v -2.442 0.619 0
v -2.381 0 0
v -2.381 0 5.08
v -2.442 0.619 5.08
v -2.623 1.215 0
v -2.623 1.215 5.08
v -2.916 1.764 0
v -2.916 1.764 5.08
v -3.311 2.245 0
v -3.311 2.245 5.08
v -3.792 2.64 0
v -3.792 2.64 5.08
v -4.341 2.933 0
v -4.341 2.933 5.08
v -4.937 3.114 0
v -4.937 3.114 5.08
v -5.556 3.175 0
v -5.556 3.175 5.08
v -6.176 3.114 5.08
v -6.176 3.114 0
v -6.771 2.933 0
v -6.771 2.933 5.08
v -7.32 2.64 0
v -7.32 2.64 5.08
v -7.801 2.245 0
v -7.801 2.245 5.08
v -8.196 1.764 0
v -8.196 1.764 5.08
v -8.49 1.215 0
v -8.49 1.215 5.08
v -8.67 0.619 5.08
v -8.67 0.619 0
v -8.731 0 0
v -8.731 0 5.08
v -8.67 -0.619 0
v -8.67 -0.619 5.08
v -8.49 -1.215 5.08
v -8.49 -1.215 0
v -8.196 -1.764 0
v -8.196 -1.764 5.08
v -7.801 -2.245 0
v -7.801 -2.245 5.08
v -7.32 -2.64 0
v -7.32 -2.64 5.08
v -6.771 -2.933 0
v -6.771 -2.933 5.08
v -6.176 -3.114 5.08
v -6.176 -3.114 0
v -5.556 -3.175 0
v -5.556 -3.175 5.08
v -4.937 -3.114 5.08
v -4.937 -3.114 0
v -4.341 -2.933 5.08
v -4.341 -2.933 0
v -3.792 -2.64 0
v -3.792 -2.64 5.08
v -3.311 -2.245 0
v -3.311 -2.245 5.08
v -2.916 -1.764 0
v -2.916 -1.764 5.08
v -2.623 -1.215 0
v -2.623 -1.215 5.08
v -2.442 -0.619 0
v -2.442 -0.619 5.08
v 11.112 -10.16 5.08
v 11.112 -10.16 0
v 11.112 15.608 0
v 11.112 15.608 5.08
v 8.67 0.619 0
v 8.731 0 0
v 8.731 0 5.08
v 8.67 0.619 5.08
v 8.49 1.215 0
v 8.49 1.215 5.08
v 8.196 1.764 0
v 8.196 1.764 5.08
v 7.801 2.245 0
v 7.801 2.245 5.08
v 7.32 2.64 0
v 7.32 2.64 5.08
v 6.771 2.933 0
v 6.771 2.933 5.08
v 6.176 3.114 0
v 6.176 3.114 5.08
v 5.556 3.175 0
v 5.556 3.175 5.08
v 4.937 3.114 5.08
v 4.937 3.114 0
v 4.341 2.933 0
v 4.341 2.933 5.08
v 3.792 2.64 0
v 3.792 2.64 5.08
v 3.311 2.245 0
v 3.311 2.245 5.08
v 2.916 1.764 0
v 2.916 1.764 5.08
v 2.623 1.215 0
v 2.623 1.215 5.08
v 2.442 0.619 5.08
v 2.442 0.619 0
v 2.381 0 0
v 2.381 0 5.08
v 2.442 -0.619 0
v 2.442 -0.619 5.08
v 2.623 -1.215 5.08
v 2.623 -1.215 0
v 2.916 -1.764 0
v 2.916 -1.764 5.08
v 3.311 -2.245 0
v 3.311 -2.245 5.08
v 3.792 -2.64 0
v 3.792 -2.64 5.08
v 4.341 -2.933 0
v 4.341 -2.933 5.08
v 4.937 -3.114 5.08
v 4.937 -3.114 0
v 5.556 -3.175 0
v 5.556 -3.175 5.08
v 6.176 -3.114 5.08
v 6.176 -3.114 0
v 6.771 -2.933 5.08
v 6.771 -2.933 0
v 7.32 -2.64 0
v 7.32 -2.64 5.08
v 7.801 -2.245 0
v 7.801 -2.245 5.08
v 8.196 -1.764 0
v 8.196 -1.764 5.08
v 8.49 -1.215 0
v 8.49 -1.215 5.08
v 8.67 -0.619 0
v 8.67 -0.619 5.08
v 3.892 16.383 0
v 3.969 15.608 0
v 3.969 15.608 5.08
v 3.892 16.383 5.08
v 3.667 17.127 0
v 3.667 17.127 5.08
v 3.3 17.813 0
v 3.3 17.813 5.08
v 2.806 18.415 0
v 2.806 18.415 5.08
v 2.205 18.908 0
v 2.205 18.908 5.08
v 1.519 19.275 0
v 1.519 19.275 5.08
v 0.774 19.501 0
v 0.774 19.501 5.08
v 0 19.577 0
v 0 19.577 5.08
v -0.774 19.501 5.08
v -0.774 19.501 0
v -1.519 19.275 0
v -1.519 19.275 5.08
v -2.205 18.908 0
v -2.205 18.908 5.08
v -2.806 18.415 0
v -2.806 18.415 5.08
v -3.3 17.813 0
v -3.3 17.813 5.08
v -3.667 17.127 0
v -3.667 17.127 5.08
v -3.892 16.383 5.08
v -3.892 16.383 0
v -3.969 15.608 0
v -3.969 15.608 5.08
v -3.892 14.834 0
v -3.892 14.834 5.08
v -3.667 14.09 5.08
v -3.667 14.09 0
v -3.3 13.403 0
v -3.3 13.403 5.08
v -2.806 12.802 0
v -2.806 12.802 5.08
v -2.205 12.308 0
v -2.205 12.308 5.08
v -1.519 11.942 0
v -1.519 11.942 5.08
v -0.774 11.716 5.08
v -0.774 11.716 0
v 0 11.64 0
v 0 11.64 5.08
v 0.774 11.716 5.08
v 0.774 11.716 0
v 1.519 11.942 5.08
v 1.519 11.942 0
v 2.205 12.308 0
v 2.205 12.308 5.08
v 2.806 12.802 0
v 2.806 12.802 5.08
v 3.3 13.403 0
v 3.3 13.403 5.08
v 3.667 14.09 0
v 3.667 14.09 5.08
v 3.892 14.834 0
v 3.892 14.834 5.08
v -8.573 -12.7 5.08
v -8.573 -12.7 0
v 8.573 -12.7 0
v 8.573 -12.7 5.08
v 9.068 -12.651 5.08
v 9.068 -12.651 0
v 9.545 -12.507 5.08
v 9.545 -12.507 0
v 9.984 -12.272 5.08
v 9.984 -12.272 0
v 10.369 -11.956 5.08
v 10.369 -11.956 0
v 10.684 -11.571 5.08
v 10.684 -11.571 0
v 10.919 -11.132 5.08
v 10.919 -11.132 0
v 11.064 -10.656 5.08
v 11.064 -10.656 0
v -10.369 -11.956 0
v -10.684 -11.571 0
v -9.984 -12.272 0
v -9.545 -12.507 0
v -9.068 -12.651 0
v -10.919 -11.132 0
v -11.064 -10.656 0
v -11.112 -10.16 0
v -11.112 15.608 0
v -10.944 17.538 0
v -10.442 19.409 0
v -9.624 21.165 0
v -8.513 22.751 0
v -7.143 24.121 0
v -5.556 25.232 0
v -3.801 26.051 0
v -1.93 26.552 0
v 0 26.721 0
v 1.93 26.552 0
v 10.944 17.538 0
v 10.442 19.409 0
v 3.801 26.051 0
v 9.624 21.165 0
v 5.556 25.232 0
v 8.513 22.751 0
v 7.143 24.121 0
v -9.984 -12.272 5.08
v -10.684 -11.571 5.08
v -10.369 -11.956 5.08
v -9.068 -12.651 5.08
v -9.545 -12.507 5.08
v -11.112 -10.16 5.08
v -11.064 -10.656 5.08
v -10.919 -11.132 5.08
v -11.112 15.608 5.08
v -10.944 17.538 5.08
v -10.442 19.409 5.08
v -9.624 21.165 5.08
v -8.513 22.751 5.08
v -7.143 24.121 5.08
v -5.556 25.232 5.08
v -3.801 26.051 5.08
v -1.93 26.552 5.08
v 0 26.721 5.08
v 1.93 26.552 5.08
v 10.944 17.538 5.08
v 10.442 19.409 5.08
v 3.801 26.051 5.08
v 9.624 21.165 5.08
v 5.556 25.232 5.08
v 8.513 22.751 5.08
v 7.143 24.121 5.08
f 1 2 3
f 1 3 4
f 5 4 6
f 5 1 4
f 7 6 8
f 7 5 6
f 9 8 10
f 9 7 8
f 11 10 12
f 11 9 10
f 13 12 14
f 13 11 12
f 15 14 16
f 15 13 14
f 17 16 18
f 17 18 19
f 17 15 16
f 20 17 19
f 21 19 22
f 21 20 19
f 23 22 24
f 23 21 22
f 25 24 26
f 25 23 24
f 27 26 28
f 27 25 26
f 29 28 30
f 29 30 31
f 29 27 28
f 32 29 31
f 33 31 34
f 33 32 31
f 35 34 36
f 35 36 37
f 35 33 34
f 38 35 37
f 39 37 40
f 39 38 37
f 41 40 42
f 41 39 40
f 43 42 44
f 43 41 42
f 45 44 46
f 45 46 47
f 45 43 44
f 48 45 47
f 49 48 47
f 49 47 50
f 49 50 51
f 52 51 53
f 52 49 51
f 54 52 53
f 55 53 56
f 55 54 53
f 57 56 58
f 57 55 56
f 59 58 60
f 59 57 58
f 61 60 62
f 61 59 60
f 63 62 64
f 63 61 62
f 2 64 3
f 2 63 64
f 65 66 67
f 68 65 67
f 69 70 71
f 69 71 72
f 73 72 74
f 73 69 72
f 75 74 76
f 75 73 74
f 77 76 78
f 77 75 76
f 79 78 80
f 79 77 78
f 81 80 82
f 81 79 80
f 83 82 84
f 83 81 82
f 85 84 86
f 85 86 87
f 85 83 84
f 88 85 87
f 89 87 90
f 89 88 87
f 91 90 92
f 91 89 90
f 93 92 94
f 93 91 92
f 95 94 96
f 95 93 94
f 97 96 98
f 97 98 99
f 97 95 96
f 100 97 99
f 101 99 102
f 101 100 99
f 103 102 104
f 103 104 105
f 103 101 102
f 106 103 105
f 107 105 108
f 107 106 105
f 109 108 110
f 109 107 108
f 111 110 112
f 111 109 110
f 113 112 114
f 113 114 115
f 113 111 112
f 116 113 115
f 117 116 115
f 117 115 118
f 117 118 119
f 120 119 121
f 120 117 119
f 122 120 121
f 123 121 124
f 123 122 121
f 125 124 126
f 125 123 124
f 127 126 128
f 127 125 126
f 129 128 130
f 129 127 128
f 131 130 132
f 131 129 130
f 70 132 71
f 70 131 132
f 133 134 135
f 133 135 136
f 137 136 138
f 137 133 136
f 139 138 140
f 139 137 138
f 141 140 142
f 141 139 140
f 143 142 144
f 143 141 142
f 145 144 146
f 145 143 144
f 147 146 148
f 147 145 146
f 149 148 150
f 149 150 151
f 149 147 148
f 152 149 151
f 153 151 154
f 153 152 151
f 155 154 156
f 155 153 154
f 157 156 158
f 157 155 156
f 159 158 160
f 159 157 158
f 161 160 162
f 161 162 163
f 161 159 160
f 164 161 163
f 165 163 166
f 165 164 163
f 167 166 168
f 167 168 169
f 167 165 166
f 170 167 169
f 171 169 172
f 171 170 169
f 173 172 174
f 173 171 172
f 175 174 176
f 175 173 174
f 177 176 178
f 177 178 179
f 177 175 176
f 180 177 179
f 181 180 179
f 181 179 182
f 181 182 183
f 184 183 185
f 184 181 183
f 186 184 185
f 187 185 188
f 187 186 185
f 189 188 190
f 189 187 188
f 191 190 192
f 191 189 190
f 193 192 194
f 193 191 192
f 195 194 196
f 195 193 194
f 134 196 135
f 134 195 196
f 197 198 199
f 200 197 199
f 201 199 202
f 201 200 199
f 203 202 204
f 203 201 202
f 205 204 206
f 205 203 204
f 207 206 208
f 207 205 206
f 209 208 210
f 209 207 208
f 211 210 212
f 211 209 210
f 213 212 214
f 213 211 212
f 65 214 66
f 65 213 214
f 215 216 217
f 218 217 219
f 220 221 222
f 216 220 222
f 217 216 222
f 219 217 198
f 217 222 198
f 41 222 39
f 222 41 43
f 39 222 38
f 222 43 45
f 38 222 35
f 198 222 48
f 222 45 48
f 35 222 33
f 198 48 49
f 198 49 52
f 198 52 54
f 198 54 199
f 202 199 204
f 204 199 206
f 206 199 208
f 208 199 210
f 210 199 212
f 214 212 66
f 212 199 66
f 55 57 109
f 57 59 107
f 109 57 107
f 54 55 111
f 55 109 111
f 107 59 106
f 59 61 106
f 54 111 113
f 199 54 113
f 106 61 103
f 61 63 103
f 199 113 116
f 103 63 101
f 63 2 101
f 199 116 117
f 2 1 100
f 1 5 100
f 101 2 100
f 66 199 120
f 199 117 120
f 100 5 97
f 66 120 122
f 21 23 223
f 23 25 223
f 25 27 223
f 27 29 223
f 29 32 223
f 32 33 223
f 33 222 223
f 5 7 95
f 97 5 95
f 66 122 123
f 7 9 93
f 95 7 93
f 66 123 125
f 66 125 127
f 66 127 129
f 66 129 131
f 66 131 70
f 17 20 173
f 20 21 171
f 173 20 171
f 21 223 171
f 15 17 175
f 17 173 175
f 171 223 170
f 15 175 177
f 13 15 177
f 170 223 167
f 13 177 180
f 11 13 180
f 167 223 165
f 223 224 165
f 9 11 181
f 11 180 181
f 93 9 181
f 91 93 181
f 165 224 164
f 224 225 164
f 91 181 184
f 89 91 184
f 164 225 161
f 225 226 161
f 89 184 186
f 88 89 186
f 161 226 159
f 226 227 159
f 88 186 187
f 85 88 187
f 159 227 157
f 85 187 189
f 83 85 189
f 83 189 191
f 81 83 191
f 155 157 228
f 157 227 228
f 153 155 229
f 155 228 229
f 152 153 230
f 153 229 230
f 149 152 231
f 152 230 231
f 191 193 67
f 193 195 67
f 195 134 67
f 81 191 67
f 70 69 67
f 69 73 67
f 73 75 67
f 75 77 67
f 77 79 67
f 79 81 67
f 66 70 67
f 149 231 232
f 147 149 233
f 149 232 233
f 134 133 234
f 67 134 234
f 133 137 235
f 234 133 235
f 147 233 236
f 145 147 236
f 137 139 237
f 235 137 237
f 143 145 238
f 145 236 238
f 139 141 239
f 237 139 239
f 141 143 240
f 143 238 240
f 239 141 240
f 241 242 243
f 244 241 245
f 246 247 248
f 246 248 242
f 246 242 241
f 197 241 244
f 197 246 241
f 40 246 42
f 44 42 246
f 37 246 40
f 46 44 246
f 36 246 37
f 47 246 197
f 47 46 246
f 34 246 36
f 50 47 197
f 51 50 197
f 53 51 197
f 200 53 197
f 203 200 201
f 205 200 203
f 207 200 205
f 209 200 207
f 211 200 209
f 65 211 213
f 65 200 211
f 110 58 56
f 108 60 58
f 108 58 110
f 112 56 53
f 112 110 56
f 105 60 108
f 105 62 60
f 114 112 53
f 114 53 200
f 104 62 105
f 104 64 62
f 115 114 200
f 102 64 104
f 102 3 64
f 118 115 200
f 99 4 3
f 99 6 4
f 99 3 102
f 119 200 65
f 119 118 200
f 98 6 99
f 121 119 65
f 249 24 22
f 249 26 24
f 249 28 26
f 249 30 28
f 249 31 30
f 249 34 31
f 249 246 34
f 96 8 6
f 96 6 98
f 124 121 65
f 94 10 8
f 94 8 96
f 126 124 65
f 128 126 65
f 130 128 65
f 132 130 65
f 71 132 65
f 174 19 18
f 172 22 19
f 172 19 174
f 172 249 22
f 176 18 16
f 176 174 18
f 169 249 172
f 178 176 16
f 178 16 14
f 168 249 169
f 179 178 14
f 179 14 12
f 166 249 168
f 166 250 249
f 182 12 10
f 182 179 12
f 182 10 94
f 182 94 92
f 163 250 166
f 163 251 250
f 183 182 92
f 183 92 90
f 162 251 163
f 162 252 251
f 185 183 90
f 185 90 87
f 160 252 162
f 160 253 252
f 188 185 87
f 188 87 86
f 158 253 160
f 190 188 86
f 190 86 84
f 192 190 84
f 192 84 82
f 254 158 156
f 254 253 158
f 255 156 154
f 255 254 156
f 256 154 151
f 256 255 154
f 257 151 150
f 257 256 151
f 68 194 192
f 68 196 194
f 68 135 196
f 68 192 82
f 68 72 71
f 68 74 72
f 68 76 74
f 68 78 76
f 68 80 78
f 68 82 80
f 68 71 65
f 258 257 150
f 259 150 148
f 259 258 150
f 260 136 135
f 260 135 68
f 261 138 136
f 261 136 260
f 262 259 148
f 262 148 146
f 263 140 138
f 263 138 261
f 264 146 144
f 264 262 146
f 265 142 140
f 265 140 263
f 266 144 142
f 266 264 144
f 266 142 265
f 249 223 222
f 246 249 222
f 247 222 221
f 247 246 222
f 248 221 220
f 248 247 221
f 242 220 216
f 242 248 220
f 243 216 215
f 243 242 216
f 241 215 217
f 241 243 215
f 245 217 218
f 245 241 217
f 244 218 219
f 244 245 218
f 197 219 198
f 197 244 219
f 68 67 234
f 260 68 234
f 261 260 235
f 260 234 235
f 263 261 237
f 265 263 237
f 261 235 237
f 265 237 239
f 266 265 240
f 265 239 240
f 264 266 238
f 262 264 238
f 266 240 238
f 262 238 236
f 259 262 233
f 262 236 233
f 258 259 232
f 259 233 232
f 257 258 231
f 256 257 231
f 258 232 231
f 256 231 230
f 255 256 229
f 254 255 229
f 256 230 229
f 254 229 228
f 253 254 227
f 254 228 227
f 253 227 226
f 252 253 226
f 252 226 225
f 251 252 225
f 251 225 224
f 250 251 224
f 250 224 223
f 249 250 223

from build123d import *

# Parameters (mm, degrees)
SKETCH1_R           = 3.96875
SKETCH1_R_2         = 3.175
BOSS_EXTRUDE1_DEPTH = 5.08
FILLET1_R           = 2.54


with BuildPart() as part:
    # Sketch1 → Boss-Extrude1 (new body)
    with BuildSketch(Plane.XY):
        with BuildLine():
            Line((-11.1125, 15.6083), (-11.1125, 12.7))
            Line((-11.1125, 12.7), (-11.1125, -12.7))
            Line((-11.1125, -12.7), (11.1125, -12.7))
            Line((11.1125, -12.7), (11.1125, 12.7))
            Line((11.1125, 12.7), (11.1125, 15.6083))
            ThreePointArc((11.1125, 15.6083), (0, 26.7208), (-11.1125, 15.6083))
        make_face()
        with Locations((0, 15.6083)):
            Circle(SKETCH1_R, mode=Mode.SUBTRACT)
        with Locations((-5.55625, 0)):
            Circle(SKETCH1_R_2, mode=Mode.SUBTRACT)
        with Locations((5.55625, 0)):
            Circle(SKETCH1_R_2, mode=Mode.SUBTRACT)
    extrude(amount=BOSS_EXTRUDE1_DEPTH)

    # Fillet1
    fillet1_edges = [part.edges().sort_by_distance(p)[0] for p in [
        (11.1125, -12.7, 2.54),
        (-11.1125, -12.7, 2.54),
    ]]
    fillet(fillet1_edges, radius=FILLET1_R)


solid = part.part
